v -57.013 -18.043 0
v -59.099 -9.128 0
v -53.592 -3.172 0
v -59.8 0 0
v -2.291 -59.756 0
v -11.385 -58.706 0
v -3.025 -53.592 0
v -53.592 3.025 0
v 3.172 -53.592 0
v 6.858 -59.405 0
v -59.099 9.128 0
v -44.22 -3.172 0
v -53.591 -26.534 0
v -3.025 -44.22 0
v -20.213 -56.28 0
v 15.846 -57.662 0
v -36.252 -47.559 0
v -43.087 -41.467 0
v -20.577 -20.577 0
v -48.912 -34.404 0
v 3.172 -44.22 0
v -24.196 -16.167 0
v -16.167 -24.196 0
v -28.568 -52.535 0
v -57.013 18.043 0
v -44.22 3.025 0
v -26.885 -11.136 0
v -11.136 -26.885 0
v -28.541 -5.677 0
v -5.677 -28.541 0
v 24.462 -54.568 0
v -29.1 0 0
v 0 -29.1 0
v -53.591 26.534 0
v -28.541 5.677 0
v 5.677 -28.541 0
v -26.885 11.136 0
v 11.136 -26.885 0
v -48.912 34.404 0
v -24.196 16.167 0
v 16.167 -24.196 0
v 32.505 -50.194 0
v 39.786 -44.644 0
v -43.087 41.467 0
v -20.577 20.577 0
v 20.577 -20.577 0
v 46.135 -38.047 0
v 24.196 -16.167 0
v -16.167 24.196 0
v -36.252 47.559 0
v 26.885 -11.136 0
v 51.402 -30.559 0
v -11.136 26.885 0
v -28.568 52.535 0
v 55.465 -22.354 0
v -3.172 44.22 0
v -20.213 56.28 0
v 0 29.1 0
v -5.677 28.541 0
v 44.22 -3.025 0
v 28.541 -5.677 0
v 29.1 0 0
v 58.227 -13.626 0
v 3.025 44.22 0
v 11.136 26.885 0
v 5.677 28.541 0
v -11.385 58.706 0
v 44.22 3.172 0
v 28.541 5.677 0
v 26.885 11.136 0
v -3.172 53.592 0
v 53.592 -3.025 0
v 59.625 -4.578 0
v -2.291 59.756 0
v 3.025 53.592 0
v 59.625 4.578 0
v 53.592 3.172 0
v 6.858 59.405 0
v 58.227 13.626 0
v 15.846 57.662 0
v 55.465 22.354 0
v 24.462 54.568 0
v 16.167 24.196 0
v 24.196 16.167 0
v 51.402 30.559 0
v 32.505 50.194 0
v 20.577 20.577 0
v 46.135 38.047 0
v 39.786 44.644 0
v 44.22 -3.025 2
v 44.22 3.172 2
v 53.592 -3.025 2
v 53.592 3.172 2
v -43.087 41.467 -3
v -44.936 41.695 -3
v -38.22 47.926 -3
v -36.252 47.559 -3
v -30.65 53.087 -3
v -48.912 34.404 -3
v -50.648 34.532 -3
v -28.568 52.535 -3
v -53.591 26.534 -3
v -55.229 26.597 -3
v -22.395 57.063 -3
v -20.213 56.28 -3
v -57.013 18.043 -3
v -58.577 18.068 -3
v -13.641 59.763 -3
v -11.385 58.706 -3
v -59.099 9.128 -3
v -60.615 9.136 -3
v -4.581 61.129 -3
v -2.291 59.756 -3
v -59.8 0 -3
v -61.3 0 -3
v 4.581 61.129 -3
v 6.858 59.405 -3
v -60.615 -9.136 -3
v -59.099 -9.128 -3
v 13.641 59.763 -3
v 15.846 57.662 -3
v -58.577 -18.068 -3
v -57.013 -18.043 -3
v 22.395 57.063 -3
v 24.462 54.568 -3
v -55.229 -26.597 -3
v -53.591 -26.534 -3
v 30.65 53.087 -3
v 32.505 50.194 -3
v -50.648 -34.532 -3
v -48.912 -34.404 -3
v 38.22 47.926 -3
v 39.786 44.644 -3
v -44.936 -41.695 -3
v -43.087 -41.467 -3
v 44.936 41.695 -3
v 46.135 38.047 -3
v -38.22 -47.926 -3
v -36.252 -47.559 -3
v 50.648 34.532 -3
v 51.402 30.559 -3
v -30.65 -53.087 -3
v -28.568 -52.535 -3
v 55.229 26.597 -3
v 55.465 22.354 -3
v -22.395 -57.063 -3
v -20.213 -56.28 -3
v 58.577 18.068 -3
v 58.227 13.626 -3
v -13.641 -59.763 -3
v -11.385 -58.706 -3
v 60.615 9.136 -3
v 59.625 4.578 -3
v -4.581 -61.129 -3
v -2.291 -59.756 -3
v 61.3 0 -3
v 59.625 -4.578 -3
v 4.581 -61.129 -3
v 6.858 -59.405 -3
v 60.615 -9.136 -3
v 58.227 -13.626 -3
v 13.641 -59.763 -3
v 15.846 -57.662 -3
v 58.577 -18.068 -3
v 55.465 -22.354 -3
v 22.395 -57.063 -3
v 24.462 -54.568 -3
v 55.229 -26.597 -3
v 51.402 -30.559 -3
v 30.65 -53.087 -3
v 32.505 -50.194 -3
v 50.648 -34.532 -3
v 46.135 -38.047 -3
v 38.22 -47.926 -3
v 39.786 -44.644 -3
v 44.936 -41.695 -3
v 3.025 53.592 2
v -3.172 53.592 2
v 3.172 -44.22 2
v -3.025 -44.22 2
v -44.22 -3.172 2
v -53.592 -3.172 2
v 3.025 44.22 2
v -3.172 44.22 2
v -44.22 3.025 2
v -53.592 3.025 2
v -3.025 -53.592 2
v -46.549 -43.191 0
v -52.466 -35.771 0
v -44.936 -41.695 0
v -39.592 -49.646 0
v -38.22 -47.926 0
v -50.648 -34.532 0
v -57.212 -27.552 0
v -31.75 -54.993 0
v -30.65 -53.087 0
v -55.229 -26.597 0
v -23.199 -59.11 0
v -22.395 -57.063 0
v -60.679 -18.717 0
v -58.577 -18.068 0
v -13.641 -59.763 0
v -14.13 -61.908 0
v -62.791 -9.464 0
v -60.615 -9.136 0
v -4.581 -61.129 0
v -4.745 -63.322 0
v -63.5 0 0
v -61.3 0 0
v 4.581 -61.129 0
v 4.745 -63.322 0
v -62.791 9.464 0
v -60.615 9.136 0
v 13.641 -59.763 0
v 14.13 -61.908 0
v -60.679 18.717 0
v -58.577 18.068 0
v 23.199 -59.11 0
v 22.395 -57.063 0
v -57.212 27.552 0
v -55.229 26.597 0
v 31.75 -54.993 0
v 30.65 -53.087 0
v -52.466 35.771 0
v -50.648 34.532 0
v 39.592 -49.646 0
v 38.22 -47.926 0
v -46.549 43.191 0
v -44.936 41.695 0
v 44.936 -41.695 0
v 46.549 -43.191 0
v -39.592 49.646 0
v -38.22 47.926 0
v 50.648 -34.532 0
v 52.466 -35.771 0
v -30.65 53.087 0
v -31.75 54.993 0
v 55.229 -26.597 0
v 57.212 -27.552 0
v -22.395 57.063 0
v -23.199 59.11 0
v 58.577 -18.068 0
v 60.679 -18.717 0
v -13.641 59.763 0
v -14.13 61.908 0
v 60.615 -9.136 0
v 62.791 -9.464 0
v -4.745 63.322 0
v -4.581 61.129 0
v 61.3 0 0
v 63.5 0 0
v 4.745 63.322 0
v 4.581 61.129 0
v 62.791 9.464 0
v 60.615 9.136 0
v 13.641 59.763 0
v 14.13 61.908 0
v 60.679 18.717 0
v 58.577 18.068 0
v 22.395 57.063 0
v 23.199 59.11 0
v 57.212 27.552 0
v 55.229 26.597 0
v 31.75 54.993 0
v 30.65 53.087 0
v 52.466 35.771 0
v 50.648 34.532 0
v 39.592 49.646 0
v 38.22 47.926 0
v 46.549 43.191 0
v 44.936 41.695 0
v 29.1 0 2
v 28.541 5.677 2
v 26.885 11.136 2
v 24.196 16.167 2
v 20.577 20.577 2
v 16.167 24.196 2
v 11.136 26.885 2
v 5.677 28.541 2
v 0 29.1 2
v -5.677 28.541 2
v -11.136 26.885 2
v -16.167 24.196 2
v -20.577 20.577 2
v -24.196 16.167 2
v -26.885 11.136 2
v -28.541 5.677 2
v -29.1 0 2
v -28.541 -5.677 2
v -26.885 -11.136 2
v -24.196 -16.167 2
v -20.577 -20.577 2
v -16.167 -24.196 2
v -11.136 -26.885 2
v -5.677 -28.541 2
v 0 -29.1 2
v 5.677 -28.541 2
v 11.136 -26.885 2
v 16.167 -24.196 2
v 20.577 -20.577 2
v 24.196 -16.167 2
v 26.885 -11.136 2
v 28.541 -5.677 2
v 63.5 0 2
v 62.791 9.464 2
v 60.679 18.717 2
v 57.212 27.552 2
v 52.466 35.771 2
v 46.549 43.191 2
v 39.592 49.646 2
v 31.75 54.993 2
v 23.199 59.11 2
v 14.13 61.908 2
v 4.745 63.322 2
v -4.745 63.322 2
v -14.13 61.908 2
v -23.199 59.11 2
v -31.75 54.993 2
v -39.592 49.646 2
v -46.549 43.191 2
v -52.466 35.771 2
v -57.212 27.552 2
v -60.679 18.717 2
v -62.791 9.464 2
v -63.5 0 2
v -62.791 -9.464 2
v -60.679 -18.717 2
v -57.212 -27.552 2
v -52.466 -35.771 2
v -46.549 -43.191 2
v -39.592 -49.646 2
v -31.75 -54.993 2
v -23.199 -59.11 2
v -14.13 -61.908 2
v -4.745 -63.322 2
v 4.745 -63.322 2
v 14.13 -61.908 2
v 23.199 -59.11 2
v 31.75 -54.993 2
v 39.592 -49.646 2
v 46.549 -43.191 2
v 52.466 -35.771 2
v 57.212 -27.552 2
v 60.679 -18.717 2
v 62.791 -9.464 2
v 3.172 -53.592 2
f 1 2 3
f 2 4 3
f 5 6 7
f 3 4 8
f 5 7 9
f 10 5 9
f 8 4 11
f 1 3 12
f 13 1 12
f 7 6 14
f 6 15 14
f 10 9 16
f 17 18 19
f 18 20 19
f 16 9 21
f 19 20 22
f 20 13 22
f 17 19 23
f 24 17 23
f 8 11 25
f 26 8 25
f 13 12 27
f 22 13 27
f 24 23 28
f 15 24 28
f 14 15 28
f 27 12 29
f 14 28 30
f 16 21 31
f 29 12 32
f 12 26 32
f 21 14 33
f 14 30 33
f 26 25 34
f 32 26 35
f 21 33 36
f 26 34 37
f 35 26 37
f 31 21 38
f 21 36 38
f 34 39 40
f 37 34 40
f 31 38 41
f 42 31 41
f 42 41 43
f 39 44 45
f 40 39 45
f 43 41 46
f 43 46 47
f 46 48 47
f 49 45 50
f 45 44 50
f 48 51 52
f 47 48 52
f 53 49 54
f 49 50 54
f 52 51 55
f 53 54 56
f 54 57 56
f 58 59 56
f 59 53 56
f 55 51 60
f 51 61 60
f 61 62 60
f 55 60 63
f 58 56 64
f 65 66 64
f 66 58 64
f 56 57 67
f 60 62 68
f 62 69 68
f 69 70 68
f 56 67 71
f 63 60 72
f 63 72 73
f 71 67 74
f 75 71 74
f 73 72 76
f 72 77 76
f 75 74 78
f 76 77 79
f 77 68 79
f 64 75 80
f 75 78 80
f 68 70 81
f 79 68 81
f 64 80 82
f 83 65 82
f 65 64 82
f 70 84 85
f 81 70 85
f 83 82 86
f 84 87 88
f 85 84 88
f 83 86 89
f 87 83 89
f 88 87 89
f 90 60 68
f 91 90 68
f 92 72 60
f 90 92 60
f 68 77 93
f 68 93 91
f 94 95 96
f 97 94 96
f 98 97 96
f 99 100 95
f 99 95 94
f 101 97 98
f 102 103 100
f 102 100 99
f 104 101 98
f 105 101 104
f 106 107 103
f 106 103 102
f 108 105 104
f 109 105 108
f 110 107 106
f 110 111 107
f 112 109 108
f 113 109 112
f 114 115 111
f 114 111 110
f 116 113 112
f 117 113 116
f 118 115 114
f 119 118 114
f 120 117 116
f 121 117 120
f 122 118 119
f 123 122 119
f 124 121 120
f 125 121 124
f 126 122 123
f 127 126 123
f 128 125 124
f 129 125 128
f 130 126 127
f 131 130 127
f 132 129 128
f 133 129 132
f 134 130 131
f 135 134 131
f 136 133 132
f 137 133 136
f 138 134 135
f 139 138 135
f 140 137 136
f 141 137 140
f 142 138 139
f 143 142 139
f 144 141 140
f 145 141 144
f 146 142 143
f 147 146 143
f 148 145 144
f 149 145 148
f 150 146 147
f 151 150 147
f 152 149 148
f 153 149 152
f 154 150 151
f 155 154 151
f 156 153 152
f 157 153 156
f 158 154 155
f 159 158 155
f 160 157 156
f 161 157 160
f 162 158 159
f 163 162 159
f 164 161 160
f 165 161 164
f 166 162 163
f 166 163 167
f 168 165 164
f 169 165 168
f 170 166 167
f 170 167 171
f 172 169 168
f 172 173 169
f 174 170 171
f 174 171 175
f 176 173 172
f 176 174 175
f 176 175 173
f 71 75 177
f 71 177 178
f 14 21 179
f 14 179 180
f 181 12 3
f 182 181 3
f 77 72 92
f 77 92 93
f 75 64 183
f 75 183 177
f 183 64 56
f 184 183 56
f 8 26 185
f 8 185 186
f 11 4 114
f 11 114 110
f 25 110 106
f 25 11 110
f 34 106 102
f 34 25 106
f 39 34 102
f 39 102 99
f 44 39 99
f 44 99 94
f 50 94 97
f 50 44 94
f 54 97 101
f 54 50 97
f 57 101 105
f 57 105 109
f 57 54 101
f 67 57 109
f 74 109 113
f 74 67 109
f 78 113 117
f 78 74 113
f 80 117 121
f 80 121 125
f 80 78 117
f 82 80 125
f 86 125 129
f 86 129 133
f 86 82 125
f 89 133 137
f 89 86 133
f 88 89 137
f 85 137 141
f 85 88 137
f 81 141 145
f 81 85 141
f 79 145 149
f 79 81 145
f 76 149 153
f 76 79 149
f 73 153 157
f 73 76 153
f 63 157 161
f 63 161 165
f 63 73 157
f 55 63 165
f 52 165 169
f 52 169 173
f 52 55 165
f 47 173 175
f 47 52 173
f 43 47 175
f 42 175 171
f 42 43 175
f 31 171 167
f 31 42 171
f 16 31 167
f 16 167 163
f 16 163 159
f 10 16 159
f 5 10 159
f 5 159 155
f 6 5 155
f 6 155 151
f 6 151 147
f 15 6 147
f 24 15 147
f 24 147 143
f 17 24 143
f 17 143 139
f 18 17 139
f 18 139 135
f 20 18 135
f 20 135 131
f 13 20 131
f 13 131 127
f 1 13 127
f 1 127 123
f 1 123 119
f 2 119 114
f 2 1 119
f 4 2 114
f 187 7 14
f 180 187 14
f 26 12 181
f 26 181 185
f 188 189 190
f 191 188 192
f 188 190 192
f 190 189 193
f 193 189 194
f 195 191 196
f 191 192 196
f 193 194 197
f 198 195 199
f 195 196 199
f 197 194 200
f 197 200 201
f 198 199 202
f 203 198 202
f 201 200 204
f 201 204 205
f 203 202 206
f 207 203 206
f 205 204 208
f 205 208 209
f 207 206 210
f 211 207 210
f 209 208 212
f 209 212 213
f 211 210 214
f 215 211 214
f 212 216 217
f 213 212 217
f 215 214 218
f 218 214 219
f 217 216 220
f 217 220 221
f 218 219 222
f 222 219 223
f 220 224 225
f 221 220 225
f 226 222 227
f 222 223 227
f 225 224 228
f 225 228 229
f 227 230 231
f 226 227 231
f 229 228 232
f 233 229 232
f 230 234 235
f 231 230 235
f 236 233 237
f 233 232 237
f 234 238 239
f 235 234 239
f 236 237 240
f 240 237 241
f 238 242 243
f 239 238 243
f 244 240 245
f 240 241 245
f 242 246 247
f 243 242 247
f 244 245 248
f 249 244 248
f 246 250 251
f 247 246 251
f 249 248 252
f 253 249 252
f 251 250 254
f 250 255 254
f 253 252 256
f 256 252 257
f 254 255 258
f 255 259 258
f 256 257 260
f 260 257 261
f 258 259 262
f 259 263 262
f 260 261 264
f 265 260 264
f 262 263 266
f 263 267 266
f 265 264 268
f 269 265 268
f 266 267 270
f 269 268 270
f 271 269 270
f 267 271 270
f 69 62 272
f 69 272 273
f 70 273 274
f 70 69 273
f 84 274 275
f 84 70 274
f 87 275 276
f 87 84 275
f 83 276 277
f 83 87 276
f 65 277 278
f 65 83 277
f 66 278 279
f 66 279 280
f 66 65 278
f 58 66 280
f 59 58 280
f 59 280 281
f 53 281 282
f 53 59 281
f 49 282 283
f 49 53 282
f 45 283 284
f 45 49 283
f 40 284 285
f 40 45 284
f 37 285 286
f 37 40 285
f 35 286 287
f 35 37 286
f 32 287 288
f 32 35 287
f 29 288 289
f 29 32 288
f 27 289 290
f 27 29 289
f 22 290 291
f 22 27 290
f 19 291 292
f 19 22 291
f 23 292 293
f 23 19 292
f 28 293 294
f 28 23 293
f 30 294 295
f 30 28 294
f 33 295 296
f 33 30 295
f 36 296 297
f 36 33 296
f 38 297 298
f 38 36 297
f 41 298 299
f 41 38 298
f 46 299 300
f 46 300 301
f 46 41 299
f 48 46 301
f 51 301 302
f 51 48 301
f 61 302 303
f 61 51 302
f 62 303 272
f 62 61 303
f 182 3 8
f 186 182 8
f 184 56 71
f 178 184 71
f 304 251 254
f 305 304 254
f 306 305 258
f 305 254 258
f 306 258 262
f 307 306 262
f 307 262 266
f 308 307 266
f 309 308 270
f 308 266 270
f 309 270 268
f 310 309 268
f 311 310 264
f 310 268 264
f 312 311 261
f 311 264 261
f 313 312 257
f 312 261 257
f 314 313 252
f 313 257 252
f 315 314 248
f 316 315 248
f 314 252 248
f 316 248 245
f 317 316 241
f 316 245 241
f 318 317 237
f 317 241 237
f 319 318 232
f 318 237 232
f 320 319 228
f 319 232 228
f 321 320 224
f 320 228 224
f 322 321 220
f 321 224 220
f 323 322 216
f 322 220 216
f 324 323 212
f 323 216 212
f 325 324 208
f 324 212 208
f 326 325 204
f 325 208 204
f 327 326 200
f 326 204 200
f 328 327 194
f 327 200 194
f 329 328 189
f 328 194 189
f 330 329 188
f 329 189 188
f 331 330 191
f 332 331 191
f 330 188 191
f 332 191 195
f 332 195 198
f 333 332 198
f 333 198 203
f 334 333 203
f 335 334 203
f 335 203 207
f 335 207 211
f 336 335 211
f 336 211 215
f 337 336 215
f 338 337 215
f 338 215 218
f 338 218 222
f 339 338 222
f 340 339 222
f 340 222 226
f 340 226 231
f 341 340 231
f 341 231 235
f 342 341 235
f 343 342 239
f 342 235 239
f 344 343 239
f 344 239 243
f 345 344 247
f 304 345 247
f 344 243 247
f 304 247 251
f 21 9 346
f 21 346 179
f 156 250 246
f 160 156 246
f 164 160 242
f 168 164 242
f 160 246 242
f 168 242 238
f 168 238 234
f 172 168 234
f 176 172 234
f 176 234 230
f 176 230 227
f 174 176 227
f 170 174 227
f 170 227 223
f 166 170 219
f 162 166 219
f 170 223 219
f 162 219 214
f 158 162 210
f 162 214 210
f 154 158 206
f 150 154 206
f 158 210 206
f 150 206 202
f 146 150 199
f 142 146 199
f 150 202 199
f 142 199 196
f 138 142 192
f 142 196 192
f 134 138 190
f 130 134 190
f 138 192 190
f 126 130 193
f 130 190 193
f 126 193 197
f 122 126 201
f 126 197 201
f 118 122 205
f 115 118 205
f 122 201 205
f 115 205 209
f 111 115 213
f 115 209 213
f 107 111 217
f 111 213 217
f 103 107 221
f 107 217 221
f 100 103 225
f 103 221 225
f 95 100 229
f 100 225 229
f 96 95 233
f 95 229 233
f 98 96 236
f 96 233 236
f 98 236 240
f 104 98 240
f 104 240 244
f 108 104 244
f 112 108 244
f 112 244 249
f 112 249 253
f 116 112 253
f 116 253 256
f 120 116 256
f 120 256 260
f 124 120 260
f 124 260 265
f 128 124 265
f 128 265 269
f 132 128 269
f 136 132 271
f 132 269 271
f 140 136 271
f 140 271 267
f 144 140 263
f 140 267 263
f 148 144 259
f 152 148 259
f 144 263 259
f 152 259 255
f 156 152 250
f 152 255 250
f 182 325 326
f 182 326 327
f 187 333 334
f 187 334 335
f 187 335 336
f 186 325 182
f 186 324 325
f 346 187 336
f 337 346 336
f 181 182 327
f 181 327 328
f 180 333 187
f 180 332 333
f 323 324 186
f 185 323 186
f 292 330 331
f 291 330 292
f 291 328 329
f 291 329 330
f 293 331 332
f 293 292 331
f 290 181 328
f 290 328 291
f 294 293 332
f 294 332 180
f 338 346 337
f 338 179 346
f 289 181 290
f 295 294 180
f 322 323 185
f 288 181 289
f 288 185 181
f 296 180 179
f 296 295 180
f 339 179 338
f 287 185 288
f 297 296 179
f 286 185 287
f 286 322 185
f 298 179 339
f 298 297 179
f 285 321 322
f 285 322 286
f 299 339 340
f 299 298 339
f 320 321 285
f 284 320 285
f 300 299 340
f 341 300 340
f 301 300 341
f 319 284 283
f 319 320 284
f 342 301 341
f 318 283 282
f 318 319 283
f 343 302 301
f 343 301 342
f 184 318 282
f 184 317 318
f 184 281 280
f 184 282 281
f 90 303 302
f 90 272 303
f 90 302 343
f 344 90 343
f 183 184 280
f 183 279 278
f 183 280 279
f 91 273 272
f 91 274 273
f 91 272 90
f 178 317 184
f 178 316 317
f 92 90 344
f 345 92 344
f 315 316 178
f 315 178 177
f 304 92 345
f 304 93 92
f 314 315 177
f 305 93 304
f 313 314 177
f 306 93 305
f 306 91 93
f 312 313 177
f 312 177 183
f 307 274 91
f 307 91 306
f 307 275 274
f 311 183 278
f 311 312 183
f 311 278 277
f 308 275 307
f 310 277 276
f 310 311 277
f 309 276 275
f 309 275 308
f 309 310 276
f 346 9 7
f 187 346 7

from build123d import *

# Parameters (mm, degrees)
SKETCH1_R           = 63.5
SKETCH1_R_2         = 29.1
SKETCH1_W           = 9.3726
SKETCH1_H           = 6.1976
SKETCH1_W_2         = 6.1976
SKETCH1_H_2         = 9.3726
BOSS_EXTRUDE1_DEPTH = 2
SKETCH2_R           = 61.3
SKETCH2_R_2         = 59.8
BOSS_EXTRUDE2_DEPTH = 3


with BuildPart() as part:
    # Sketch1 → Boss-Extrude1 (new body)
    with BuildSketch(Plane(origin=(0, 0, 0), x_dir=(0, 1, 0), z_dir=(0, 0, 1))):
        with Locations(Location((0, 0, 0), (0, 0, 270))):
            Circle(SKETCH1_R)
        with Locations(Location((0, 0, 0), (0, 0, 270))):
            Circle(SKETCH1_R_2, mode=Mode.SUBTRACT)
        with Locations((48.905920984, 0.073333248)):
            Rectangle(SKETCH1_W, SKETCH1_H, mode=Mode.SUBTRACT)
        with Locations((-0.073333248, 48.905920984)):
            Rectangle(SKETCH1_W_2, SKETCH1_H_2, mode=Mode.SUBTRACT)
        with Locations((0.073333248, -48.905920984)):
            Rectangle(SKETCH1_W_2, SKETCH1_H_2, mode=Mode.SUBTRACT)
        with Locations((-48.905920984, -0.073333248)):
            Rectangle(SKETCH1_W, SKETCH1_H, mode=Mode.SUBTRACT)
    extrude(amount=BOSS_EXTRUDE1_DEPTH)

    # Sketch2 → Boss-Extrude2 (add)
    with BuildSketch(Plane(origin=(0, 0, 0), x_dir=(1, 0, 0), z_dir=(0, 0, -1))):
        Circle(SKETCH2_R)
        with Locations(Location((0, 0, 0), (0, 0, 180))):
            Circle(SKETCH2_R_2, mode=Mode.SUBTRACT)
    extrude(amount=BOSS_EXTRUDE2_DEPTH)


solid = part.part
